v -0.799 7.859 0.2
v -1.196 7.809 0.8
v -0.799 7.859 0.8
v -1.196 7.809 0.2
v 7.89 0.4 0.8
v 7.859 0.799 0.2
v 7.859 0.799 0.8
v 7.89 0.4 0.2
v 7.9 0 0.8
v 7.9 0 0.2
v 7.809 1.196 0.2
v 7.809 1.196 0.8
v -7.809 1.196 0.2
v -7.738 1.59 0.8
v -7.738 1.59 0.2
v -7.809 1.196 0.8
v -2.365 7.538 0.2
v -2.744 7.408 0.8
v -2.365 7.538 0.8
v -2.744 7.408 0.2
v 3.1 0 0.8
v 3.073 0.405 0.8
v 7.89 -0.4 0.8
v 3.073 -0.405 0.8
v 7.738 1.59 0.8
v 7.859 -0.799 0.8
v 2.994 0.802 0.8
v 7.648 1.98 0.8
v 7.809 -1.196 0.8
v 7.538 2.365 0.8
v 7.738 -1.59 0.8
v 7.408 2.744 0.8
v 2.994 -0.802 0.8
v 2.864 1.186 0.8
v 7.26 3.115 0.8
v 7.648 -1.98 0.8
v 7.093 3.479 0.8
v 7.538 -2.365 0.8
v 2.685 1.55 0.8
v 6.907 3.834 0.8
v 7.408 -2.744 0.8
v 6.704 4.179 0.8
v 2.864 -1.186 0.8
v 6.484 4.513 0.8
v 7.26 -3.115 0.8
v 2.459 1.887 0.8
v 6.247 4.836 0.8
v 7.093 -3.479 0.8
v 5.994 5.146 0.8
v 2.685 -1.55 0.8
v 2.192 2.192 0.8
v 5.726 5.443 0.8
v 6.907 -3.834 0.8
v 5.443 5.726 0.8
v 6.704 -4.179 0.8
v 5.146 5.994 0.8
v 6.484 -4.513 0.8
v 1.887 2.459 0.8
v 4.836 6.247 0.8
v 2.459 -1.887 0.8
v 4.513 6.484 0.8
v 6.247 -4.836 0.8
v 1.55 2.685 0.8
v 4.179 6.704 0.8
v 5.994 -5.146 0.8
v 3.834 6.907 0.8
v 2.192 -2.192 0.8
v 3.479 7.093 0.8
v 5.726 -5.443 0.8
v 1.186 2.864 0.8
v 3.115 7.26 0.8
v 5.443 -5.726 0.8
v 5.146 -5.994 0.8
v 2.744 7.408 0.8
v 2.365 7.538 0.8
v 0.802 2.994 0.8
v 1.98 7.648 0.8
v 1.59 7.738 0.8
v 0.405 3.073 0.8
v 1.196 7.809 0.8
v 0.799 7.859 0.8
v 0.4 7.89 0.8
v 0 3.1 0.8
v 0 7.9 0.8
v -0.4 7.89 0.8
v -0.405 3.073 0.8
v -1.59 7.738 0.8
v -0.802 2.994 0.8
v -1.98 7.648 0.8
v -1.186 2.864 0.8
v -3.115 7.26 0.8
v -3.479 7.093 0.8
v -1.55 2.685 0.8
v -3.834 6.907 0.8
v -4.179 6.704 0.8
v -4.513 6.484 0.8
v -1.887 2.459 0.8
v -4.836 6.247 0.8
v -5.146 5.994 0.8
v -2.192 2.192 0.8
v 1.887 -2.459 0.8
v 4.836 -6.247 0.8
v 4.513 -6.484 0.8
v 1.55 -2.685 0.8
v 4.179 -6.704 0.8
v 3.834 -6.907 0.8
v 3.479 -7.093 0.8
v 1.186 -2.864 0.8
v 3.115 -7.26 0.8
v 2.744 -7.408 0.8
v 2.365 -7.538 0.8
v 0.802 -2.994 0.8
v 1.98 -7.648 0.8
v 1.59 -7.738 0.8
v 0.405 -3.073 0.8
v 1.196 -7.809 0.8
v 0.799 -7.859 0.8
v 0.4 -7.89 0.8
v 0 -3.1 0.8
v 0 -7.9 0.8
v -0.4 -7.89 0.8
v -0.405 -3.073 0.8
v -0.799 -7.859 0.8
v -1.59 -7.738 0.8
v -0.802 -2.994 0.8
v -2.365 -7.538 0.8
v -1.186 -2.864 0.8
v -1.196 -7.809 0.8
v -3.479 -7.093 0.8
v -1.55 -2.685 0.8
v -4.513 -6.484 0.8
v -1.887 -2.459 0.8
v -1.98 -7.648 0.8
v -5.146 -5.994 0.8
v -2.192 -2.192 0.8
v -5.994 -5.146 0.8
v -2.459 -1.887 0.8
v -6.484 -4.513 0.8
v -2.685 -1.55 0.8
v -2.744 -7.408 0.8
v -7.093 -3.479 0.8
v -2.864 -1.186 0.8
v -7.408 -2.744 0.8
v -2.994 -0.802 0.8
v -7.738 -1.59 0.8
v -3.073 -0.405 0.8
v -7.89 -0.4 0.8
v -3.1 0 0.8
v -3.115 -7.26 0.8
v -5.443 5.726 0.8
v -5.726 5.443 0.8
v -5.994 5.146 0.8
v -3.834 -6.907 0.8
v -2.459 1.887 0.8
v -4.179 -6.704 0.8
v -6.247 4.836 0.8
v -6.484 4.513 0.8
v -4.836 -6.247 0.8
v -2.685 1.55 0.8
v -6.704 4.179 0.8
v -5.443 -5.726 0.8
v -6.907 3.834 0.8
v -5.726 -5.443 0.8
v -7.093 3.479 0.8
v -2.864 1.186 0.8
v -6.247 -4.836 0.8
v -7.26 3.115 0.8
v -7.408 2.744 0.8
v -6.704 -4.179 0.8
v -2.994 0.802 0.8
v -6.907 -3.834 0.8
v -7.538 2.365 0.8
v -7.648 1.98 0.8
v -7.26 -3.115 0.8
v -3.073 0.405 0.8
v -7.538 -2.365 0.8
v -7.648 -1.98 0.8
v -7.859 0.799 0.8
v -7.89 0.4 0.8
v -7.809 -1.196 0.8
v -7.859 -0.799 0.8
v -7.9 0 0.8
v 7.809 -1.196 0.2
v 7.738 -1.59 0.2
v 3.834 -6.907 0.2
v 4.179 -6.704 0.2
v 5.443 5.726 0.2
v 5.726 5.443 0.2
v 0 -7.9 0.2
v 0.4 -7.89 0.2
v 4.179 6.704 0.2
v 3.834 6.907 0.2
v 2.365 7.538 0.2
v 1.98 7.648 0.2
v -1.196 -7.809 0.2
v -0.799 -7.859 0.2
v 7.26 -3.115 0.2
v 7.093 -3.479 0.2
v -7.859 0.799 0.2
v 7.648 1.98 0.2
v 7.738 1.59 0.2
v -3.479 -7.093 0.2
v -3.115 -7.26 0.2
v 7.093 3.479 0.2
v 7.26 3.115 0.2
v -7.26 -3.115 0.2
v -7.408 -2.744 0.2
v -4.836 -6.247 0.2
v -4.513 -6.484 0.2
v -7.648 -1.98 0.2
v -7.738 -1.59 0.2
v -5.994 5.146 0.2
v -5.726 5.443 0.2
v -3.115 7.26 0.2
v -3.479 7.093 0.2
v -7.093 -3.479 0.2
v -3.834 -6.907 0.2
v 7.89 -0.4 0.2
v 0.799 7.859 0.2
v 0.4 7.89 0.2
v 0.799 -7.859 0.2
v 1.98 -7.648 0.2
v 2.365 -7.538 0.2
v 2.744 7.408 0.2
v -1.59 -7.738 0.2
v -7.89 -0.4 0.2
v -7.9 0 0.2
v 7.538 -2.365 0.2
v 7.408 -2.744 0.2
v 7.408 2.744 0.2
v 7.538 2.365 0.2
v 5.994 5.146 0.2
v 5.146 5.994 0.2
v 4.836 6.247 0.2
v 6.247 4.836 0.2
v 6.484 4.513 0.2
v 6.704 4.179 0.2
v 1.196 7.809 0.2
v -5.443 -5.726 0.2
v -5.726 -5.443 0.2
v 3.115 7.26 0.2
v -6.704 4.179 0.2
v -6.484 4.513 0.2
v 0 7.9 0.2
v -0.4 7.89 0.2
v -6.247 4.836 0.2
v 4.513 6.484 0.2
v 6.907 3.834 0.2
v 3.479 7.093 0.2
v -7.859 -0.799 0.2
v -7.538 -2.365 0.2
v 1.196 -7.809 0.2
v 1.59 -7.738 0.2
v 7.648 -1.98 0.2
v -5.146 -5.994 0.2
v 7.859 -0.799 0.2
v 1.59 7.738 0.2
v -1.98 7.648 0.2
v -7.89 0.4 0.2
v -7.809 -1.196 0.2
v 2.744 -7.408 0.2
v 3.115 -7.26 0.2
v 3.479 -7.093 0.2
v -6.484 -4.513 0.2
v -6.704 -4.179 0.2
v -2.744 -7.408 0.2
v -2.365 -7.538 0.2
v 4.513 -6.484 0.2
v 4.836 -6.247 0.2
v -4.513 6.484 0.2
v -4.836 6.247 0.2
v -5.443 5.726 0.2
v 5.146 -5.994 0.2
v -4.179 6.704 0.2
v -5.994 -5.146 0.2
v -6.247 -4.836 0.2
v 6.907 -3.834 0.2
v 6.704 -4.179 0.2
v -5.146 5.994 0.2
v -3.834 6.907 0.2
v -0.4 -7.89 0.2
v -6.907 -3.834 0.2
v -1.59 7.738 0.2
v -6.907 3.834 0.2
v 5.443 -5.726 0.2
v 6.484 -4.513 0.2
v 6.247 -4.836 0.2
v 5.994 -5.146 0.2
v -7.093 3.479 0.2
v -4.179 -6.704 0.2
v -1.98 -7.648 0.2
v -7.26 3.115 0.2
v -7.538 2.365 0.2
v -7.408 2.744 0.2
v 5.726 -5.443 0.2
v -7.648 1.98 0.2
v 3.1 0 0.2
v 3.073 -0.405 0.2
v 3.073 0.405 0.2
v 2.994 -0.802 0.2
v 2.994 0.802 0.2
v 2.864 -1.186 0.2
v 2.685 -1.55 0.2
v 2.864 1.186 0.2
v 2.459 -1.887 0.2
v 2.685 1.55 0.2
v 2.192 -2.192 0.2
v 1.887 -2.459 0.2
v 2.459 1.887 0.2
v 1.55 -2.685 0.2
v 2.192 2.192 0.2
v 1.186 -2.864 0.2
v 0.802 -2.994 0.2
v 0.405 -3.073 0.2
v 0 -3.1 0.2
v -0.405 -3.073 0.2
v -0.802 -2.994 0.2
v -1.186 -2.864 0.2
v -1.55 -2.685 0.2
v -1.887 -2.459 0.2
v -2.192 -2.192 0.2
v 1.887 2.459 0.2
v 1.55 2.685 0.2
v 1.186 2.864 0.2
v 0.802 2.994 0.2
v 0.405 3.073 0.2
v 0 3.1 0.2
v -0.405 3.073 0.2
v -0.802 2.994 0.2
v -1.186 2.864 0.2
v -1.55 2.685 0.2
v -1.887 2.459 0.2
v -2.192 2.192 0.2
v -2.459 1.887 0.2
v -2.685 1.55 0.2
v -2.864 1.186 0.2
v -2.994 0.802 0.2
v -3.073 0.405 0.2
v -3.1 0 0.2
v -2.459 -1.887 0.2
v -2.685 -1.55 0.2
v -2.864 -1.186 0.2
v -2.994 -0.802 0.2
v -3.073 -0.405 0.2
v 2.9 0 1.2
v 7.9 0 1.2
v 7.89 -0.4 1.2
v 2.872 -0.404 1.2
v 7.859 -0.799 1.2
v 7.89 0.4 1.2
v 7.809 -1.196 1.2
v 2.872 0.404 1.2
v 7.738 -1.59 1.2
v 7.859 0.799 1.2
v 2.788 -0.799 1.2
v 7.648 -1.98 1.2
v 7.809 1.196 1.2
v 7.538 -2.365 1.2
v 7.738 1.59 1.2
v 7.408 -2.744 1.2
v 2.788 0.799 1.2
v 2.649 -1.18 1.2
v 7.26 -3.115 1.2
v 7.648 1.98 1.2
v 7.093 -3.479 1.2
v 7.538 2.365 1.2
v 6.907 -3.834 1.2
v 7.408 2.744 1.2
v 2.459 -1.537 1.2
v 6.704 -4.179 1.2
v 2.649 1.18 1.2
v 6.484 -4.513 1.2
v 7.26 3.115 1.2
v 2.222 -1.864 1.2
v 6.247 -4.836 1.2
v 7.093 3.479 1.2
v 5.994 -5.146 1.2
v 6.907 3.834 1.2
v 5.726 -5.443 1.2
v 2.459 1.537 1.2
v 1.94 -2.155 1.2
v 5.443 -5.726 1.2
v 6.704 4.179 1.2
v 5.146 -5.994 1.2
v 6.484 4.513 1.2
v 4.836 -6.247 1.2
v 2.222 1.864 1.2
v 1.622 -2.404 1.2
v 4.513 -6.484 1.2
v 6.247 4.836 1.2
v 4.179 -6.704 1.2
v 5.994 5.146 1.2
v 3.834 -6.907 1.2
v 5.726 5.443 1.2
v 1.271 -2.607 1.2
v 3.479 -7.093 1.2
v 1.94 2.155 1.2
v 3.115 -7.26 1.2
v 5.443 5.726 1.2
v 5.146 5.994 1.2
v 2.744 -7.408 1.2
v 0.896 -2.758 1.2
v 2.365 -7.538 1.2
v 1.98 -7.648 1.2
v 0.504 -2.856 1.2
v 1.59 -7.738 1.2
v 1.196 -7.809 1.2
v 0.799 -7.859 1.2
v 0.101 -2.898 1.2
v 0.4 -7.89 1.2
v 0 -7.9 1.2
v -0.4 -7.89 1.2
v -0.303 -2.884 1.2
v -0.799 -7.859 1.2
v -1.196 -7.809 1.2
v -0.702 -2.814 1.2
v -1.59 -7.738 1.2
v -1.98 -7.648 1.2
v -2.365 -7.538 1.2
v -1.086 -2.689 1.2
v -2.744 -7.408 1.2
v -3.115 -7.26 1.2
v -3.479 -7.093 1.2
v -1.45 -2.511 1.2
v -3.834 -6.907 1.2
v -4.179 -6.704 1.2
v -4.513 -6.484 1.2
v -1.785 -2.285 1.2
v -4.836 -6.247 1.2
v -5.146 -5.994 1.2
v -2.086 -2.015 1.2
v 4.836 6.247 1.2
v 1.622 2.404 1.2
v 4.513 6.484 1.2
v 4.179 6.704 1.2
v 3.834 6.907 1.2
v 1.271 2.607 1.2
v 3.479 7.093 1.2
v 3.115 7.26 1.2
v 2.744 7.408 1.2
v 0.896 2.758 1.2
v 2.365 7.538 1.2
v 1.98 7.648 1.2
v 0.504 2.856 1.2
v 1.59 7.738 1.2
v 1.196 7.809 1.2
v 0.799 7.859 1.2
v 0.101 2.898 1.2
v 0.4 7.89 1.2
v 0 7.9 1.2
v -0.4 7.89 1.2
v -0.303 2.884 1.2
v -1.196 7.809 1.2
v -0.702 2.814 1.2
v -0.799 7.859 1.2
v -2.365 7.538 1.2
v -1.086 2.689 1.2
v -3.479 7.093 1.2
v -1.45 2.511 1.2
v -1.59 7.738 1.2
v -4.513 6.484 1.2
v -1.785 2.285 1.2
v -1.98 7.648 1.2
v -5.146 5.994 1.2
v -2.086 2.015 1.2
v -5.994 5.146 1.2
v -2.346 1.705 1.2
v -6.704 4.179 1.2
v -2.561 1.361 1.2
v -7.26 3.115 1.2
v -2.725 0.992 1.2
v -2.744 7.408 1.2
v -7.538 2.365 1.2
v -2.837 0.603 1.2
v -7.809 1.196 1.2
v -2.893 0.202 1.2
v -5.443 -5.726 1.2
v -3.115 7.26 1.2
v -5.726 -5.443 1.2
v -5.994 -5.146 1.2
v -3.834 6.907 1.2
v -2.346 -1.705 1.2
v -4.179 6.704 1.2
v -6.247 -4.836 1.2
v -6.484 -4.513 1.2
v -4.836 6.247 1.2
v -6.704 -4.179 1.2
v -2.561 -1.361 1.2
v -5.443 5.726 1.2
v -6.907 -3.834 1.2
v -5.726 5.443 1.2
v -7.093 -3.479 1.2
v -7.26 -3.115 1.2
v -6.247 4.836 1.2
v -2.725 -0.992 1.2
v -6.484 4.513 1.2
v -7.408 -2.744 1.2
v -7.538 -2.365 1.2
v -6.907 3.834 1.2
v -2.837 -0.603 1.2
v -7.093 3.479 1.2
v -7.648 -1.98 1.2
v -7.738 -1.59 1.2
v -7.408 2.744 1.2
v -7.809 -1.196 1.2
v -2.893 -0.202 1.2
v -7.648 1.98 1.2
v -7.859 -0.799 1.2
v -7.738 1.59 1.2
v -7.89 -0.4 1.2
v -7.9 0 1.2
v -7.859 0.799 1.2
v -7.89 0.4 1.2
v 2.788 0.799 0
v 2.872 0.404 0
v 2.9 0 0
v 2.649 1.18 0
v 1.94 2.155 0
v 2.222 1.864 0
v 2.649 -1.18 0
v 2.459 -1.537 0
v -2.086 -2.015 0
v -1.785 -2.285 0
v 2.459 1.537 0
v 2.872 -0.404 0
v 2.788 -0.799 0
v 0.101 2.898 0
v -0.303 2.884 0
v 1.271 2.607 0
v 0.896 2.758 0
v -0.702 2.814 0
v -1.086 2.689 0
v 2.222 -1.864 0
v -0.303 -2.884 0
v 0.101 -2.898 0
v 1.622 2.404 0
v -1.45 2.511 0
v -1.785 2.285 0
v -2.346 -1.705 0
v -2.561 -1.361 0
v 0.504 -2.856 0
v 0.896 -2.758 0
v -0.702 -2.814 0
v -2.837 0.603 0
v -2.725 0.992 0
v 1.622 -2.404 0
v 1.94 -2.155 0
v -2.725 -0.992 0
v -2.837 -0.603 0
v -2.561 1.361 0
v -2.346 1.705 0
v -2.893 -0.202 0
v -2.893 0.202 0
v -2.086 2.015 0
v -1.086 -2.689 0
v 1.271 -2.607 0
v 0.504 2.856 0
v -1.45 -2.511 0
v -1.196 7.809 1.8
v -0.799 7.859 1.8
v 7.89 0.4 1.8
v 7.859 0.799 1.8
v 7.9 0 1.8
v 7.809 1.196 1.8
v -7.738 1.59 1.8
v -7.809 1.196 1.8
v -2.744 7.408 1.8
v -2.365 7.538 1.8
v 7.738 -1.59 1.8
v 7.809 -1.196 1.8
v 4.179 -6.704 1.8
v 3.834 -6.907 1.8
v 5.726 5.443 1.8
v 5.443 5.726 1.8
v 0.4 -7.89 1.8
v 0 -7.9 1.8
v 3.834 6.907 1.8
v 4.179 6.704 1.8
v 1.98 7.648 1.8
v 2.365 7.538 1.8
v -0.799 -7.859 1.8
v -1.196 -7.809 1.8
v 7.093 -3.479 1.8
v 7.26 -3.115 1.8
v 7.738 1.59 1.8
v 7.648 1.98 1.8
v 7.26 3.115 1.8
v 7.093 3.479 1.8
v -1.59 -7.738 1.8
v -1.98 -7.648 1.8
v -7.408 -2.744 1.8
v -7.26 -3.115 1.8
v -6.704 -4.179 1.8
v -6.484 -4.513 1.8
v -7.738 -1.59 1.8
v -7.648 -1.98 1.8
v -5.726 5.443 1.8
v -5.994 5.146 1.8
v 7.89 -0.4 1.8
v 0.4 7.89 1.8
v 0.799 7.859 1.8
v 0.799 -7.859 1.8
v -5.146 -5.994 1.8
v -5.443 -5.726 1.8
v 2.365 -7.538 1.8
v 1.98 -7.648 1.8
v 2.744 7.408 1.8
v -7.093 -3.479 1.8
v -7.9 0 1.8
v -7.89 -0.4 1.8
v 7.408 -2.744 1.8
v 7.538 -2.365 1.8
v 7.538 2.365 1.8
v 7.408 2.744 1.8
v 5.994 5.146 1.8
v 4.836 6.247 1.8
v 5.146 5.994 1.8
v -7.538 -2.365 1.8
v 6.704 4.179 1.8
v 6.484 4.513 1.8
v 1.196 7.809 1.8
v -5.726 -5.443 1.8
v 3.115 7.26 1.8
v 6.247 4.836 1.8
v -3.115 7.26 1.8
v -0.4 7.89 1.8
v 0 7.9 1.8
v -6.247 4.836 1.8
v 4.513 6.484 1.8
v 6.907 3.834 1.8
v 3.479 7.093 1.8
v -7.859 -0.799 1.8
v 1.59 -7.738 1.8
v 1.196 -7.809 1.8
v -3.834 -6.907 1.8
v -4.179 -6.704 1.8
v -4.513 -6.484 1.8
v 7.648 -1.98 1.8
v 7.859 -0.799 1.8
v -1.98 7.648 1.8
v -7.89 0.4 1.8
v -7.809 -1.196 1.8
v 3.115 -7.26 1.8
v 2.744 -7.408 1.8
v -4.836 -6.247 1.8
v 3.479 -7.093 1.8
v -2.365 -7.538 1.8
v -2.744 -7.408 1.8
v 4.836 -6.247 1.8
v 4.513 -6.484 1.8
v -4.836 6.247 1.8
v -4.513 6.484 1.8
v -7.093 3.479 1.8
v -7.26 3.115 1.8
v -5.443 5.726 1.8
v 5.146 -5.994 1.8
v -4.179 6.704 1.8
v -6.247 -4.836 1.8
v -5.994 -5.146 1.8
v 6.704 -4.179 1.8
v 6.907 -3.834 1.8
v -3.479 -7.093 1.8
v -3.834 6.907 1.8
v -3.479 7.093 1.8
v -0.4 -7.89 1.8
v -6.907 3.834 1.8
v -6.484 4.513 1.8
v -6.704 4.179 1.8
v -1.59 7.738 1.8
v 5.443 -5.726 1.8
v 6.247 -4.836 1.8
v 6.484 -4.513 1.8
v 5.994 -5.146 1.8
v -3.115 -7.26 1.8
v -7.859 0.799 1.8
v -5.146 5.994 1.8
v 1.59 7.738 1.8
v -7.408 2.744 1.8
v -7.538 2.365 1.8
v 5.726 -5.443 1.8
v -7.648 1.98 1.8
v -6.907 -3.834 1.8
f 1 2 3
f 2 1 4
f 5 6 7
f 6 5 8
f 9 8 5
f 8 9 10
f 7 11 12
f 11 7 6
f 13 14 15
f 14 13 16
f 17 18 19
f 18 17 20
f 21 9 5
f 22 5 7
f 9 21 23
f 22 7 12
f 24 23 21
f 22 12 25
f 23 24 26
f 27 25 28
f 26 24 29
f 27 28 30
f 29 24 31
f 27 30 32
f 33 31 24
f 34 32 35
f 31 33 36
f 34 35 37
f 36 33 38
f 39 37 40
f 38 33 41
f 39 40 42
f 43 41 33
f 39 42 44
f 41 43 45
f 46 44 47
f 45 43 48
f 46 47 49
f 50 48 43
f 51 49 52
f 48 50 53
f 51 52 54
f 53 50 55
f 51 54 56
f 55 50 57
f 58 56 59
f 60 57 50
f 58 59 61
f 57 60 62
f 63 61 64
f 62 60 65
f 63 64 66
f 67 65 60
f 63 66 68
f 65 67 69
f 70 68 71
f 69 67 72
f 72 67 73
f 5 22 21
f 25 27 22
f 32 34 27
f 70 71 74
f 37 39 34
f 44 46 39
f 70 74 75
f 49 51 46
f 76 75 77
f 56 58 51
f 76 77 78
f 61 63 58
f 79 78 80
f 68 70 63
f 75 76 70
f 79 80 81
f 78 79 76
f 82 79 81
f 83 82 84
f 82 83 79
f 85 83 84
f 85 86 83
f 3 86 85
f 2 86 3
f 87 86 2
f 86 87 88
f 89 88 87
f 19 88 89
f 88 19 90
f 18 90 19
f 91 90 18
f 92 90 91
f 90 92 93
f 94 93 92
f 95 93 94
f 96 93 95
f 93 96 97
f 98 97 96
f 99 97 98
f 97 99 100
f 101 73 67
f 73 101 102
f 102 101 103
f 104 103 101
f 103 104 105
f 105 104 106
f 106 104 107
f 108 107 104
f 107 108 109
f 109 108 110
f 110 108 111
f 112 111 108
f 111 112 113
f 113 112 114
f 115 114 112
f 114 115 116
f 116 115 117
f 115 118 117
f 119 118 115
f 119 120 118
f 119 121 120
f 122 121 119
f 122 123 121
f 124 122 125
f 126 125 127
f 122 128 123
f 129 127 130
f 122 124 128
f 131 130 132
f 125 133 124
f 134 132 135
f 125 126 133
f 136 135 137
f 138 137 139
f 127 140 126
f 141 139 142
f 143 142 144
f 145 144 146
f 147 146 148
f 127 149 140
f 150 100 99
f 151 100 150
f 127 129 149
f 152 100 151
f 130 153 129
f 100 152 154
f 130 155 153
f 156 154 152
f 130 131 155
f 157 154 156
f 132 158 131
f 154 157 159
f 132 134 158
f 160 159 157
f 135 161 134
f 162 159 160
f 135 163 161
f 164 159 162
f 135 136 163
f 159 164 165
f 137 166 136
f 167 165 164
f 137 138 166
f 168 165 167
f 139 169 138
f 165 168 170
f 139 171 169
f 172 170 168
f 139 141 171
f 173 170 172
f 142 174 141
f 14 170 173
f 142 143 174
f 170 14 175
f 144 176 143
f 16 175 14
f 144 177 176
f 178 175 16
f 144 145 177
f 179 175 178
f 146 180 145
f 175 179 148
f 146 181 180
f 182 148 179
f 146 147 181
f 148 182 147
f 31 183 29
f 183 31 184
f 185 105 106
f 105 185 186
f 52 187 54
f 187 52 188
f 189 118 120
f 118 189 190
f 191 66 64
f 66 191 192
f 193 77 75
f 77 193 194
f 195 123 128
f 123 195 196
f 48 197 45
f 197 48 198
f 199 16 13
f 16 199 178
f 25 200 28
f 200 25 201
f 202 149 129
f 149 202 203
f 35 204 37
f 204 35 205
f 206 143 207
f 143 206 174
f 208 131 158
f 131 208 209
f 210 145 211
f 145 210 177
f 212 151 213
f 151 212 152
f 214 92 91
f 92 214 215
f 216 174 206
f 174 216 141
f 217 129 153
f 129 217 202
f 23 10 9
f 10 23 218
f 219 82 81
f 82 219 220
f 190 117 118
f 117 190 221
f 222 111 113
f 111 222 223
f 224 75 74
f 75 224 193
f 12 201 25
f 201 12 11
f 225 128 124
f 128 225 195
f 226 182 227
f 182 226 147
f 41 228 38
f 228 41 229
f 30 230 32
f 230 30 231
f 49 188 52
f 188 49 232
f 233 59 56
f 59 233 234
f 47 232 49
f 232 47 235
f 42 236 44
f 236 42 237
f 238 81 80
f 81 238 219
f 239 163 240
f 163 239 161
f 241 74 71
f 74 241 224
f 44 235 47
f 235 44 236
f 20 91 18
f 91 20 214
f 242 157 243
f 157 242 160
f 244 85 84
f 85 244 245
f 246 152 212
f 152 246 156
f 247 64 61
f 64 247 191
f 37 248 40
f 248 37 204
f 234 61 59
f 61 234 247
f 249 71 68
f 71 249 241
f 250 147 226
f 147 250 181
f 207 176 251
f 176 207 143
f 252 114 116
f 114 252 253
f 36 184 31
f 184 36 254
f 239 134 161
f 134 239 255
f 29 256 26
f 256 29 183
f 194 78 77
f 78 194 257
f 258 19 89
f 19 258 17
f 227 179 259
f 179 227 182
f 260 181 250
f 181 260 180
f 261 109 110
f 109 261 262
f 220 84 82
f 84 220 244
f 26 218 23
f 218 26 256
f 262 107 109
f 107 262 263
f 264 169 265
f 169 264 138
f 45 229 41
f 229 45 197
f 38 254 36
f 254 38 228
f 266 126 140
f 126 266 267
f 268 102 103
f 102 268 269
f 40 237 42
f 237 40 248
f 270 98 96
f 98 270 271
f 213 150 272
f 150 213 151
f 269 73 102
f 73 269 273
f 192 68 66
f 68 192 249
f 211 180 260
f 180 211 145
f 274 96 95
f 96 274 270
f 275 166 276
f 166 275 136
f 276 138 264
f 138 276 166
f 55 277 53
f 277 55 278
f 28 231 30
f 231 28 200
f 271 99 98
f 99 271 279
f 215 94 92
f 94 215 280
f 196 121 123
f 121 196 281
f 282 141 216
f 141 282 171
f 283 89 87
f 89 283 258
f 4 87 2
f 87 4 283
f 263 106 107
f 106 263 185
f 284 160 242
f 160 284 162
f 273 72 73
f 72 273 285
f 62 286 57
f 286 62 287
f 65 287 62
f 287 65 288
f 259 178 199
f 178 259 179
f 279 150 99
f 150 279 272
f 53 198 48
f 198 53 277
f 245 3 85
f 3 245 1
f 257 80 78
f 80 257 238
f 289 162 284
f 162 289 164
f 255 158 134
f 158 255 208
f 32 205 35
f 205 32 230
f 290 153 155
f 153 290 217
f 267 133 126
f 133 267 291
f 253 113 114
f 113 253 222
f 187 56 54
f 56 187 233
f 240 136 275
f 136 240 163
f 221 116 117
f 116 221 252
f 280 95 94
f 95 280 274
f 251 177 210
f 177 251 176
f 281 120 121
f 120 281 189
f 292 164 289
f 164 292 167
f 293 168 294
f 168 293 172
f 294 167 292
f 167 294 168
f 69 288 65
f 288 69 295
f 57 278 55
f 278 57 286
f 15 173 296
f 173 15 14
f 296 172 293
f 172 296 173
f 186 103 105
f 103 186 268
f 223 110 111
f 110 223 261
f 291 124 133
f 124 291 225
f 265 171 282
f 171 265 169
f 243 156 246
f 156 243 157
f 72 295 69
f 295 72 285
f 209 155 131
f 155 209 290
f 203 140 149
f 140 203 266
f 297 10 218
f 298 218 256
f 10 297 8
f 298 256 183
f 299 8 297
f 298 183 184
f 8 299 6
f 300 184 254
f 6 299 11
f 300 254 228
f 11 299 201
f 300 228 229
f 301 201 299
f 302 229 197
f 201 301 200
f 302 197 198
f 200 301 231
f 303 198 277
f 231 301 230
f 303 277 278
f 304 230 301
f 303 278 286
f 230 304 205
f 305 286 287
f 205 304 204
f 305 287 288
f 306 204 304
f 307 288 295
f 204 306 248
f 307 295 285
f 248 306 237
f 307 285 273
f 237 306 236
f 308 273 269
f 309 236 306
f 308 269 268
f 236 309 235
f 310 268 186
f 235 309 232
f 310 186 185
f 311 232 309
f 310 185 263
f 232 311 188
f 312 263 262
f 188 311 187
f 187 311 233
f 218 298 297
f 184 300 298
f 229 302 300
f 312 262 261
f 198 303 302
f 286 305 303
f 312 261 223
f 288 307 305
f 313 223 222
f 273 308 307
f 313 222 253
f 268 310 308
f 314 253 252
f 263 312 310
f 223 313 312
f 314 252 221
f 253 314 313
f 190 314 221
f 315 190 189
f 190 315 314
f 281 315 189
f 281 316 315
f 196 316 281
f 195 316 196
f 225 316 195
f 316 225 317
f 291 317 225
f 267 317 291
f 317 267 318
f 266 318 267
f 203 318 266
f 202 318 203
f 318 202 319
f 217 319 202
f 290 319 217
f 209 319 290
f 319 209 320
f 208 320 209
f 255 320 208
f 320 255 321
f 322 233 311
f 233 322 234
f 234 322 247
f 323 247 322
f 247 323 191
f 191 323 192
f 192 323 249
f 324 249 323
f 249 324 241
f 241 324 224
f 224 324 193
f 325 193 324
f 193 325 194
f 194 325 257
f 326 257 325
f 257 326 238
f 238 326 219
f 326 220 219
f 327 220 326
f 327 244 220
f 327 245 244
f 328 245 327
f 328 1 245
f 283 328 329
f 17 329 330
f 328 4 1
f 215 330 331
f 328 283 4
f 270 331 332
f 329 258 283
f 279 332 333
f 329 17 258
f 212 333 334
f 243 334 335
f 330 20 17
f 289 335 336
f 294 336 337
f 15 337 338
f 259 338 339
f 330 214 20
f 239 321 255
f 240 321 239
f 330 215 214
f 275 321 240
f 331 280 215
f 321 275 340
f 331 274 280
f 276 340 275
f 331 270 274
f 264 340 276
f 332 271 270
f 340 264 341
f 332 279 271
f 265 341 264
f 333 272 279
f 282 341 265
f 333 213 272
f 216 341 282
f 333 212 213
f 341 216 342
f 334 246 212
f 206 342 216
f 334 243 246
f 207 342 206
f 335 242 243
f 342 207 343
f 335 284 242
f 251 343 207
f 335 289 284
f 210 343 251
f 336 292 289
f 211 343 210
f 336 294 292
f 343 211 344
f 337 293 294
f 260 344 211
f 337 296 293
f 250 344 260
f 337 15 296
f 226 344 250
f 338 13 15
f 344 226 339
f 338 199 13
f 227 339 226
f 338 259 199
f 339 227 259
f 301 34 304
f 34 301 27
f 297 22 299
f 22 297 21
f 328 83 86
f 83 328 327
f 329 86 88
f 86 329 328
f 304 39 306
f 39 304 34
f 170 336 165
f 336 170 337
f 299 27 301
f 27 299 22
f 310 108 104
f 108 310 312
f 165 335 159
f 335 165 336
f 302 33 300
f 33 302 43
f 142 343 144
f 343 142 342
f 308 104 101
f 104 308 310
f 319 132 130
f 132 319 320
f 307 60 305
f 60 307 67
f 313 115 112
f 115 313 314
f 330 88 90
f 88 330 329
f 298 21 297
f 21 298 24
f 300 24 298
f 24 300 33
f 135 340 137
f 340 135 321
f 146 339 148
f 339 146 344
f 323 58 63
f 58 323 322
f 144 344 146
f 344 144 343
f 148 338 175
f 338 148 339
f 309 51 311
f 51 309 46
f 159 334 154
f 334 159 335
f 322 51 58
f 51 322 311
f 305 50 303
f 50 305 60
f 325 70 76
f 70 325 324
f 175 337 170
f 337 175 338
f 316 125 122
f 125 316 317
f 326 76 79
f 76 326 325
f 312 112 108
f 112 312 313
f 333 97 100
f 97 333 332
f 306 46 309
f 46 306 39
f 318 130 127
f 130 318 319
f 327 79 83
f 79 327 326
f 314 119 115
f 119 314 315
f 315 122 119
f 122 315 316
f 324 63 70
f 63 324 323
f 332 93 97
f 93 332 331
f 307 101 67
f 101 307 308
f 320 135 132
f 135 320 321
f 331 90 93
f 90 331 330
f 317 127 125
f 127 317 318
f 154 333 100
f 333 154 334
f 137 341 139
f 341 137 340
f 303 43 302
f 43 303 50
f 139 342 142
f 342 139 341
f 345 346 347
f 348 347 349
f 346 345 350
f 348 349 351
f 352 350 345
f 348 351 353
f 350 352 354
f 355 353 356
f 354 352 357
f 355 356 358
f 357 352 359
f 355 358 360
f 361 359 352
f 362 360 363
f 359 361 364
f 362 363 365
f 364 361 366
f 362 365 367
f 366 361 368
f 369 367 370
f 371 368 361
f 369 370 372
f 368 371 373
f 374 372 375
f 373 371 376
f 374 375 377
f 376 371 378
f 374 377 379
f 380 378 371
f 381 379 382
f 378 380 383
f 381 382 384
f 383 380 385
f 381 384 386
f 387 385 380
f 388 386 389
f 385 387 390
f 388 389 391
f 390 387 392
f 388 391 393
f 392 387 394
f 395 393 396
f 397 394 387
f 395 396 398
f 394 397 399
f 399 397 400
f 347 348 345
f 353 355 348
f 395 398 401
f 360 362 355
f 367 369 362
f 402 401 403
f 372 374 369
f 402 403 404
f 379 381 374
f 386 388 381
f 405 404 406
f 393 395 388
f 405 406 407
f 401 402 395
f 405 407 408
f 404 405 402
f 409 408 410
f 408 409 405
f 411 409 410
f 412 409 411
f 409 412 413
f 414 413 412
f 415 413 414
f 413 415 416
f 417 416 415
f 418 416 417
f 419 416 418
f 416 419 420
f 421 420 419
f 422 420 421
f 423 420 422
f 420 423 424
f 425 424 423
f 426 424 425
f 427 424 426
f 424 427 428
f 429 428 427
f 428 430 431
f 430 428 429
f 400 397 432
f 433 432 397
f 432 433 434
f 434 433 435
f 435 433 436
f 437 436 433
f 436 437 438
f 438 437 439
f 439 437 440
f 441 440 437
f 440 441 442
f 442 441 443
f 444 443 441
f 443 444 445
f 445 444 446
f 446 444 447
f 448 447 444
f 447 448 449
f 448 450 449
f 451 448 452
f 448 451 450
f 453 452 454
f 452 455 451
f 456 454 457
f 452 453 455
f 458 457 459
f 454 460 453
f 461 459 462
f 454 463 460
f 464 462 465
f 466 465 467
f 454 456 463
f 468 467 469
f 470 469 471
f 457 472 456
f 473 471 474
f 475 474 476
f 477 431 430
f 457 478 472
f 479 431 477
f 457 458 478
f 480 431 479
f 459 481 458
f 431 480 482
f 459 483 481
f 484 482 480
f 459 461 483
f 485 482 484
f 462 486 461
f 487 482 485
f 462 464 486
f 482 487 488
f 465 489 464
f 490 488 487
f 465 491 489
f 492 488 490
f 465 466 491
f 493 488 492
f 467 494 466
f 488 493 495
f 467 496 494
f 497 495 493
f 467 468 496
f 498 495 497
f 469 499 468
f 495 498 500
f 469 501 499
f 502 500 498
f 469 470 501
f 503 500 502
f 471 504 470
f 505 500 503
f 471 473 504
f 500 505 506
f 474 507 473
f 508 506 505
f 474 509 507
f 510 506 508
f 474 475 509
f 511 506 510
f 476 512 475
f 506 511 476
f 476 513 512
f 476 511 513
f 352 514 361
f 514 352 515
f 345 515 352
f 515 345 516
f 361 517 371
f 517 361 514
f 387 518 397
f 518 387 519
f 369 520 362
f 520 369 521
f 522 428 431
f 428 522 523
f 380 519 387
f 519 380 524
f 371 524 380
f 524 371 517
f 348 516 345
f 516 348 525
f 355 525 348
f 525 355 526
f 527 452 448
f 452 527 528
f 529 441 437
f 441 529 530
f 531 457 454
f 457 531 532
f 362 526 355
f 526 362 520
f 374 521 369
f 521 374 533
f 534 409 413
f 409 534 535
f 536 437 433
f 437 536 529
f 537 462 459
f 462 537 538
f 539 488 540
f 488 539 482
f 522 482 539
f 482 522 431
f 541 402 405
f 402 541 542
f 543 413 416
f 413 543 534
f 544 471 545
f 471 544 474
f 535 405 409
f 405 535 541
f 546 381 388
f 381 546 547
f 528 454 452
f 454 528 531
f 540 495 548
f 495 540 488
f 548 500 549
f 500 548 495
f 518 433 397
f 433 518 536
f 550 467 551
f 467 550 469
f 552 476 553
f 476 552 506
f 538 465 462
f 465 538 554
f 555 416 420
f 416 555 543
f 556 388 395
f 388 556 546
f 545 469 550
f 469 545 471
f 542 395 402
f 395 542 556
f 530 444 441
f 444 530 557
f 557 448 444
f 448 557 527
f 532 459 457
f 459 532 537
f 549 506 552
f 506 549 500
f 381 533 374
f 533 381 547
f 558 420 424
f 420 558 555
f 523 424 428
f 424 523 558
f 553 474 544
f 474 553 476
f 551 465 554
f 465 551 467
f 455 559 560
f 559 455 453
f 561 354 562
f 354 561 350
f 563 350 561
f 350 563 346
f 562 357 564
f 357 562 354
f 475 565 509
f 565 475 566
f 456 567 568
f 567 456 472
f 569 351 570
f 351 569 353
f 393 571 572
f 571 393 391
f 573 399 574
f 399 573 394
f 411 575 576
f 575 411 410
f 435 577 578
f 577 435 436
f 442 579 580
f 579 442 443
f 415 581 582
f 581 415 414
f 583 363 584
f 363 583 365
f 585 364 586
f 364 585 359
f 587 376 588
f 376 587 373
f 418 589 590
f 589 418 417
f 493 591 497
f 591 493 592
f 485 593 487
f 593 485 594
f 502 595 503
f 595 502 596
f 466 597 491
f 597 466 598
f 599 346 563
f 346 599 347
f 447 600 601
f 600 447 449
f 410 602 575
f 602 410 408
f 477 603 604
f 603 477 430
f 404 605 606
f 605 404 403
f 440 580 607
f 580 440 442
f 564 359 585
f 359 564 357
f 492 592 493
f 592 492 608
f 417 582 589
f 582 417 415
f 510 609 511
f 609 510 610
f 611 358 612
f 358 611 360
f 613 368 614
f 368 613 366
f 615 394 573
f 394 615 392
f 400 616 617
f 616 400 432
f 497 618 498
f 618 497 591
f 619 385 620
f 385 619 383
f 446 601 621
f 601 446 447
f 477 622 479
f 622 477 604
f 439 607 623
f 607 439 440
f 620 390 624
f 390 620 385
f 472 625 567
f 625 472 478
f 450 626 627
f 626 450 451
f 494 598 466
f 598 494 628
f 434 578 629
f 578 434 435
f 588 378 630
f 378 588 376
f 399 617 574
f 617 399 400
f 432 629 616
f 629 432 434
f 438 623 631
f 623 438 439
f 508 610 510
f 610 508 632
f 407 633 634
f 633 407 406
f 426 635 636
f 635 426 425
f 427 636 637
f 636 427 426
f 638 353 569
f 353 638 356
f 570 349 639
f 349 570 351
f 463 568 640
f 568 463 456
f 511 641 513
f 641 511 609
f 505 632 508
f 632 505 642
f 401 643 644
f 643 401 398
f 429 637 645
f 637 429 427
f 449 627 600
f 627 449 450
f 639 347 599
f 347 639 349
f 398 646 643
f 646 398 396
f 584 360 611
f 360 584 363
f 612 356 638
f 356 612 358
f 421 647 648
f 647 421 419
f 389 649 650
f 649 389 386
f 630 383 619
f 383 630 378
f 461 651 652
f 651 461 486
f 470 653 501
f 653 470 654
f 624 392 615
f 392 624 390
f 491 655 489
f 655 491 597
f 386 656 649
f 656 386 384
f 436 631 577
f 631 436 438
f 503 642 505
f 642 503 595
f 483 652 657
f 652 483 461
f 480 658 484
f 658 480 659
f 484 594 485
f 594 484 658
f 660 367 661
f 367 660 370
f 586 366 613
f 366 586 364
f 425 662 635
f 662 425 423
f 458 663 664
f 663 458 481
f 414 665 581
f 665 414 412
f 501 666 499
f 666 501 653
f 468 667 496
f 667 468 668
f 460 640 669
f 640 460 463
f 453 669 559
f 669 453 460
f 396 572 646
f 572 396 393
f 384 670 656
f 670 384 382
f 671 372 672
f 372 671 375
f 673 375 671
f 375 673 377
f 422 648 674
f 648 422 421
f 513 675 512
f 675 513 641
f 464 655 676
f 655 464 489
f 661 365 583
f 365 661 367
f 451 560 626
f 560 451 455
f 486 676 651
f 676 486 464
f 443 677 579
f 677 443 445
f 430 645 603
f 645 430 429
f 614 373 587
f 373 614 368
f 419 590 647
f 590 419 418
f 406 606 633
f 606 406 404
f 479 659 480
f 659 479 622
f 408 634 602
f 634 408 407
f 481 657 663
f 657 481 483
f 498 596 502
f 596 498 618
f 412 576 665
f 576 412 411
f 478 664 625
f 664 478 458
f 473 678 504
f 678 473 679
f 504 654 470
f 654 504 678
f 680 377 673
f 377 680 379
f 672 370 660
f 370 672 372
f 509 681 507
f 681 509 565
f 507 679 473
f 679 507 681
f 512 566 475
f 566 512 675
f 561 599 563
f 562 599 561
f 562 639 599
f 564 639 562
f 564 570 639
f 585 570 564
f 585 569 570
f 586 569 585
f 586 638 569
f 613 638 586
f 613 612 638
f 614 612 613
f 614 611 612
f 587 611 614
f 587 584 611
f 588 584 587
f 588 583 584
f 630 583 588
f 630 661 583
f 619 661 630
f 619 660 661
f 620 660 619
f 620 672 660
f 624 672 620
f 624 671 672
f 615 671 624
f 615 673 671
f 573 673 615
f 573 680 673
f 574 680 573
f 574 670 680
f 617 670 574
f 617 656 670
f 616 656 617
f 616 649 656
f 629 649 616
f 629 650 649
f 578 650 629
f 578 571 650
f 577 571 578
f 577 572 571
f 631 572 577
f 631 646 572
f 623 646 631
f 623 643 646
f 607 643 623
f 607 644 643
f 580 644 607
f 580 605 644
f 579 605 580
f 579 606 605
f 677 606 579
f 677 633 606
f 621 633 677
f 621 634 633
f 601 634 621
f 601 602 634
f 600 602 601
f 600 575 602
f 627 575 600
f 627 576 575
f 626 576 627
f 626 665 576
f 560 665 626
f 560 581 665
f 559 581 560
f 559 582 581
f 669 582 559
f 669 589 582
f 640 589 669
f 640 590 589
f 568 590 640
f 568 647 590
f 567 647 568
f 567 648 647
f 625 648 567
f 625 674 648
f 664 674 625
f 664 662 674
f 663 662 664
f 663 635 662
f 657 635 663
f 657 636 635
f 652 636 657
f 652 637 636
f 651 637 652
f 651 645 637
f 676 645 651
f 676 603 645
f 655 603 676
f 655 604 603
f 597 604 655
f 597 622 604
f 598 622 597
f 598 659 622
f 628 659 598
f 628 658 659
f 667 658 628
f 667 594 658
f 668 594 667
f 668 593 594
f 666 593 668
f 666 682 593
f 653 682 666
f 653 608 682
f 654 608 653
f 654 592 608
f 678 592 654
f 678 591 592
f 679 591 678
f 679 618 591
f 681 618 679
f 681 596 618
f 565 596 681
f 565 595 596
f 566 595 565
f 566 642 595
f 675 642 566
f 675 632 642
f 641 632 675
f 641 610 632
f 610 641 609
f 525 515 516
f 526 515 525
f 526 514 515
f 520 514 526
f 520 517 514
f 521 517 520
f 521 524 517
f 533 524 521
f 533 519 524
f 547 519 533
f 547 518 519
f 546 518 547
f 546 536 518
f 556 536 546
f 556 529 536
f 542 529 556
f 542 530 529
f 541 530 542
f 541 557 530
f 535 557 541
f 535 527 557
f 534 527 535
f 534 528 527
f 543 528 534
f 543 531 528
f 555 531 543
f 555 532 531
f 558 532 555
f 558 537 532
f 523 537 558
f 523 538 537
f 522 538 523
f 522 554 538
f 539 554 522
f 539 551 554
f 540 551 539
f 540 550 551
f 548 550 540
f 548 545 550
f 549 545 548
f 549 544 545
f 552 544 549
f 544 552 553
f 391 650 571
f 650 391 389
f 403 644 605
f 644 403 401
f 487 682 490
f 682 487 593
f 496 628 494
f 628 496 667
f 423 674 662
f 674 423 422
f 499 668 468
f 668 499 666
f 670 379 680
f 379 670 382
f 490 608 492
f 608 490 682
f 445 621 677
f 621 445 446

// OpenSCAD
union() {
  difference() {
    // cylinder
    translate(v=[0, 0, 0.5])
    cylinder(h=0.6, d=15.8, $fn=124, center=true);
    // tunnel
    translate(v=[0, 0, 0.5])
    cylinder(h=2.6, d=6.2, $fn=48, center=true);
  }
  difference() {
    // cylinder
    translate(v=[0, 0, 0.9])
    cylinder(h=1.8, d=15.8, $fn=124, center=true);
    // female
    difference() {
      // cylinder
      translate(v=[0, 0, 0.5])
      cylinder(h=1.4, d=16.2, $fn=127, center=true);
      // tunnel
      translate(v=[0, 0, 0.5])
      cylinder(h=3.4, d=5.8, $fn=45, center=true);
    }
  }
}
